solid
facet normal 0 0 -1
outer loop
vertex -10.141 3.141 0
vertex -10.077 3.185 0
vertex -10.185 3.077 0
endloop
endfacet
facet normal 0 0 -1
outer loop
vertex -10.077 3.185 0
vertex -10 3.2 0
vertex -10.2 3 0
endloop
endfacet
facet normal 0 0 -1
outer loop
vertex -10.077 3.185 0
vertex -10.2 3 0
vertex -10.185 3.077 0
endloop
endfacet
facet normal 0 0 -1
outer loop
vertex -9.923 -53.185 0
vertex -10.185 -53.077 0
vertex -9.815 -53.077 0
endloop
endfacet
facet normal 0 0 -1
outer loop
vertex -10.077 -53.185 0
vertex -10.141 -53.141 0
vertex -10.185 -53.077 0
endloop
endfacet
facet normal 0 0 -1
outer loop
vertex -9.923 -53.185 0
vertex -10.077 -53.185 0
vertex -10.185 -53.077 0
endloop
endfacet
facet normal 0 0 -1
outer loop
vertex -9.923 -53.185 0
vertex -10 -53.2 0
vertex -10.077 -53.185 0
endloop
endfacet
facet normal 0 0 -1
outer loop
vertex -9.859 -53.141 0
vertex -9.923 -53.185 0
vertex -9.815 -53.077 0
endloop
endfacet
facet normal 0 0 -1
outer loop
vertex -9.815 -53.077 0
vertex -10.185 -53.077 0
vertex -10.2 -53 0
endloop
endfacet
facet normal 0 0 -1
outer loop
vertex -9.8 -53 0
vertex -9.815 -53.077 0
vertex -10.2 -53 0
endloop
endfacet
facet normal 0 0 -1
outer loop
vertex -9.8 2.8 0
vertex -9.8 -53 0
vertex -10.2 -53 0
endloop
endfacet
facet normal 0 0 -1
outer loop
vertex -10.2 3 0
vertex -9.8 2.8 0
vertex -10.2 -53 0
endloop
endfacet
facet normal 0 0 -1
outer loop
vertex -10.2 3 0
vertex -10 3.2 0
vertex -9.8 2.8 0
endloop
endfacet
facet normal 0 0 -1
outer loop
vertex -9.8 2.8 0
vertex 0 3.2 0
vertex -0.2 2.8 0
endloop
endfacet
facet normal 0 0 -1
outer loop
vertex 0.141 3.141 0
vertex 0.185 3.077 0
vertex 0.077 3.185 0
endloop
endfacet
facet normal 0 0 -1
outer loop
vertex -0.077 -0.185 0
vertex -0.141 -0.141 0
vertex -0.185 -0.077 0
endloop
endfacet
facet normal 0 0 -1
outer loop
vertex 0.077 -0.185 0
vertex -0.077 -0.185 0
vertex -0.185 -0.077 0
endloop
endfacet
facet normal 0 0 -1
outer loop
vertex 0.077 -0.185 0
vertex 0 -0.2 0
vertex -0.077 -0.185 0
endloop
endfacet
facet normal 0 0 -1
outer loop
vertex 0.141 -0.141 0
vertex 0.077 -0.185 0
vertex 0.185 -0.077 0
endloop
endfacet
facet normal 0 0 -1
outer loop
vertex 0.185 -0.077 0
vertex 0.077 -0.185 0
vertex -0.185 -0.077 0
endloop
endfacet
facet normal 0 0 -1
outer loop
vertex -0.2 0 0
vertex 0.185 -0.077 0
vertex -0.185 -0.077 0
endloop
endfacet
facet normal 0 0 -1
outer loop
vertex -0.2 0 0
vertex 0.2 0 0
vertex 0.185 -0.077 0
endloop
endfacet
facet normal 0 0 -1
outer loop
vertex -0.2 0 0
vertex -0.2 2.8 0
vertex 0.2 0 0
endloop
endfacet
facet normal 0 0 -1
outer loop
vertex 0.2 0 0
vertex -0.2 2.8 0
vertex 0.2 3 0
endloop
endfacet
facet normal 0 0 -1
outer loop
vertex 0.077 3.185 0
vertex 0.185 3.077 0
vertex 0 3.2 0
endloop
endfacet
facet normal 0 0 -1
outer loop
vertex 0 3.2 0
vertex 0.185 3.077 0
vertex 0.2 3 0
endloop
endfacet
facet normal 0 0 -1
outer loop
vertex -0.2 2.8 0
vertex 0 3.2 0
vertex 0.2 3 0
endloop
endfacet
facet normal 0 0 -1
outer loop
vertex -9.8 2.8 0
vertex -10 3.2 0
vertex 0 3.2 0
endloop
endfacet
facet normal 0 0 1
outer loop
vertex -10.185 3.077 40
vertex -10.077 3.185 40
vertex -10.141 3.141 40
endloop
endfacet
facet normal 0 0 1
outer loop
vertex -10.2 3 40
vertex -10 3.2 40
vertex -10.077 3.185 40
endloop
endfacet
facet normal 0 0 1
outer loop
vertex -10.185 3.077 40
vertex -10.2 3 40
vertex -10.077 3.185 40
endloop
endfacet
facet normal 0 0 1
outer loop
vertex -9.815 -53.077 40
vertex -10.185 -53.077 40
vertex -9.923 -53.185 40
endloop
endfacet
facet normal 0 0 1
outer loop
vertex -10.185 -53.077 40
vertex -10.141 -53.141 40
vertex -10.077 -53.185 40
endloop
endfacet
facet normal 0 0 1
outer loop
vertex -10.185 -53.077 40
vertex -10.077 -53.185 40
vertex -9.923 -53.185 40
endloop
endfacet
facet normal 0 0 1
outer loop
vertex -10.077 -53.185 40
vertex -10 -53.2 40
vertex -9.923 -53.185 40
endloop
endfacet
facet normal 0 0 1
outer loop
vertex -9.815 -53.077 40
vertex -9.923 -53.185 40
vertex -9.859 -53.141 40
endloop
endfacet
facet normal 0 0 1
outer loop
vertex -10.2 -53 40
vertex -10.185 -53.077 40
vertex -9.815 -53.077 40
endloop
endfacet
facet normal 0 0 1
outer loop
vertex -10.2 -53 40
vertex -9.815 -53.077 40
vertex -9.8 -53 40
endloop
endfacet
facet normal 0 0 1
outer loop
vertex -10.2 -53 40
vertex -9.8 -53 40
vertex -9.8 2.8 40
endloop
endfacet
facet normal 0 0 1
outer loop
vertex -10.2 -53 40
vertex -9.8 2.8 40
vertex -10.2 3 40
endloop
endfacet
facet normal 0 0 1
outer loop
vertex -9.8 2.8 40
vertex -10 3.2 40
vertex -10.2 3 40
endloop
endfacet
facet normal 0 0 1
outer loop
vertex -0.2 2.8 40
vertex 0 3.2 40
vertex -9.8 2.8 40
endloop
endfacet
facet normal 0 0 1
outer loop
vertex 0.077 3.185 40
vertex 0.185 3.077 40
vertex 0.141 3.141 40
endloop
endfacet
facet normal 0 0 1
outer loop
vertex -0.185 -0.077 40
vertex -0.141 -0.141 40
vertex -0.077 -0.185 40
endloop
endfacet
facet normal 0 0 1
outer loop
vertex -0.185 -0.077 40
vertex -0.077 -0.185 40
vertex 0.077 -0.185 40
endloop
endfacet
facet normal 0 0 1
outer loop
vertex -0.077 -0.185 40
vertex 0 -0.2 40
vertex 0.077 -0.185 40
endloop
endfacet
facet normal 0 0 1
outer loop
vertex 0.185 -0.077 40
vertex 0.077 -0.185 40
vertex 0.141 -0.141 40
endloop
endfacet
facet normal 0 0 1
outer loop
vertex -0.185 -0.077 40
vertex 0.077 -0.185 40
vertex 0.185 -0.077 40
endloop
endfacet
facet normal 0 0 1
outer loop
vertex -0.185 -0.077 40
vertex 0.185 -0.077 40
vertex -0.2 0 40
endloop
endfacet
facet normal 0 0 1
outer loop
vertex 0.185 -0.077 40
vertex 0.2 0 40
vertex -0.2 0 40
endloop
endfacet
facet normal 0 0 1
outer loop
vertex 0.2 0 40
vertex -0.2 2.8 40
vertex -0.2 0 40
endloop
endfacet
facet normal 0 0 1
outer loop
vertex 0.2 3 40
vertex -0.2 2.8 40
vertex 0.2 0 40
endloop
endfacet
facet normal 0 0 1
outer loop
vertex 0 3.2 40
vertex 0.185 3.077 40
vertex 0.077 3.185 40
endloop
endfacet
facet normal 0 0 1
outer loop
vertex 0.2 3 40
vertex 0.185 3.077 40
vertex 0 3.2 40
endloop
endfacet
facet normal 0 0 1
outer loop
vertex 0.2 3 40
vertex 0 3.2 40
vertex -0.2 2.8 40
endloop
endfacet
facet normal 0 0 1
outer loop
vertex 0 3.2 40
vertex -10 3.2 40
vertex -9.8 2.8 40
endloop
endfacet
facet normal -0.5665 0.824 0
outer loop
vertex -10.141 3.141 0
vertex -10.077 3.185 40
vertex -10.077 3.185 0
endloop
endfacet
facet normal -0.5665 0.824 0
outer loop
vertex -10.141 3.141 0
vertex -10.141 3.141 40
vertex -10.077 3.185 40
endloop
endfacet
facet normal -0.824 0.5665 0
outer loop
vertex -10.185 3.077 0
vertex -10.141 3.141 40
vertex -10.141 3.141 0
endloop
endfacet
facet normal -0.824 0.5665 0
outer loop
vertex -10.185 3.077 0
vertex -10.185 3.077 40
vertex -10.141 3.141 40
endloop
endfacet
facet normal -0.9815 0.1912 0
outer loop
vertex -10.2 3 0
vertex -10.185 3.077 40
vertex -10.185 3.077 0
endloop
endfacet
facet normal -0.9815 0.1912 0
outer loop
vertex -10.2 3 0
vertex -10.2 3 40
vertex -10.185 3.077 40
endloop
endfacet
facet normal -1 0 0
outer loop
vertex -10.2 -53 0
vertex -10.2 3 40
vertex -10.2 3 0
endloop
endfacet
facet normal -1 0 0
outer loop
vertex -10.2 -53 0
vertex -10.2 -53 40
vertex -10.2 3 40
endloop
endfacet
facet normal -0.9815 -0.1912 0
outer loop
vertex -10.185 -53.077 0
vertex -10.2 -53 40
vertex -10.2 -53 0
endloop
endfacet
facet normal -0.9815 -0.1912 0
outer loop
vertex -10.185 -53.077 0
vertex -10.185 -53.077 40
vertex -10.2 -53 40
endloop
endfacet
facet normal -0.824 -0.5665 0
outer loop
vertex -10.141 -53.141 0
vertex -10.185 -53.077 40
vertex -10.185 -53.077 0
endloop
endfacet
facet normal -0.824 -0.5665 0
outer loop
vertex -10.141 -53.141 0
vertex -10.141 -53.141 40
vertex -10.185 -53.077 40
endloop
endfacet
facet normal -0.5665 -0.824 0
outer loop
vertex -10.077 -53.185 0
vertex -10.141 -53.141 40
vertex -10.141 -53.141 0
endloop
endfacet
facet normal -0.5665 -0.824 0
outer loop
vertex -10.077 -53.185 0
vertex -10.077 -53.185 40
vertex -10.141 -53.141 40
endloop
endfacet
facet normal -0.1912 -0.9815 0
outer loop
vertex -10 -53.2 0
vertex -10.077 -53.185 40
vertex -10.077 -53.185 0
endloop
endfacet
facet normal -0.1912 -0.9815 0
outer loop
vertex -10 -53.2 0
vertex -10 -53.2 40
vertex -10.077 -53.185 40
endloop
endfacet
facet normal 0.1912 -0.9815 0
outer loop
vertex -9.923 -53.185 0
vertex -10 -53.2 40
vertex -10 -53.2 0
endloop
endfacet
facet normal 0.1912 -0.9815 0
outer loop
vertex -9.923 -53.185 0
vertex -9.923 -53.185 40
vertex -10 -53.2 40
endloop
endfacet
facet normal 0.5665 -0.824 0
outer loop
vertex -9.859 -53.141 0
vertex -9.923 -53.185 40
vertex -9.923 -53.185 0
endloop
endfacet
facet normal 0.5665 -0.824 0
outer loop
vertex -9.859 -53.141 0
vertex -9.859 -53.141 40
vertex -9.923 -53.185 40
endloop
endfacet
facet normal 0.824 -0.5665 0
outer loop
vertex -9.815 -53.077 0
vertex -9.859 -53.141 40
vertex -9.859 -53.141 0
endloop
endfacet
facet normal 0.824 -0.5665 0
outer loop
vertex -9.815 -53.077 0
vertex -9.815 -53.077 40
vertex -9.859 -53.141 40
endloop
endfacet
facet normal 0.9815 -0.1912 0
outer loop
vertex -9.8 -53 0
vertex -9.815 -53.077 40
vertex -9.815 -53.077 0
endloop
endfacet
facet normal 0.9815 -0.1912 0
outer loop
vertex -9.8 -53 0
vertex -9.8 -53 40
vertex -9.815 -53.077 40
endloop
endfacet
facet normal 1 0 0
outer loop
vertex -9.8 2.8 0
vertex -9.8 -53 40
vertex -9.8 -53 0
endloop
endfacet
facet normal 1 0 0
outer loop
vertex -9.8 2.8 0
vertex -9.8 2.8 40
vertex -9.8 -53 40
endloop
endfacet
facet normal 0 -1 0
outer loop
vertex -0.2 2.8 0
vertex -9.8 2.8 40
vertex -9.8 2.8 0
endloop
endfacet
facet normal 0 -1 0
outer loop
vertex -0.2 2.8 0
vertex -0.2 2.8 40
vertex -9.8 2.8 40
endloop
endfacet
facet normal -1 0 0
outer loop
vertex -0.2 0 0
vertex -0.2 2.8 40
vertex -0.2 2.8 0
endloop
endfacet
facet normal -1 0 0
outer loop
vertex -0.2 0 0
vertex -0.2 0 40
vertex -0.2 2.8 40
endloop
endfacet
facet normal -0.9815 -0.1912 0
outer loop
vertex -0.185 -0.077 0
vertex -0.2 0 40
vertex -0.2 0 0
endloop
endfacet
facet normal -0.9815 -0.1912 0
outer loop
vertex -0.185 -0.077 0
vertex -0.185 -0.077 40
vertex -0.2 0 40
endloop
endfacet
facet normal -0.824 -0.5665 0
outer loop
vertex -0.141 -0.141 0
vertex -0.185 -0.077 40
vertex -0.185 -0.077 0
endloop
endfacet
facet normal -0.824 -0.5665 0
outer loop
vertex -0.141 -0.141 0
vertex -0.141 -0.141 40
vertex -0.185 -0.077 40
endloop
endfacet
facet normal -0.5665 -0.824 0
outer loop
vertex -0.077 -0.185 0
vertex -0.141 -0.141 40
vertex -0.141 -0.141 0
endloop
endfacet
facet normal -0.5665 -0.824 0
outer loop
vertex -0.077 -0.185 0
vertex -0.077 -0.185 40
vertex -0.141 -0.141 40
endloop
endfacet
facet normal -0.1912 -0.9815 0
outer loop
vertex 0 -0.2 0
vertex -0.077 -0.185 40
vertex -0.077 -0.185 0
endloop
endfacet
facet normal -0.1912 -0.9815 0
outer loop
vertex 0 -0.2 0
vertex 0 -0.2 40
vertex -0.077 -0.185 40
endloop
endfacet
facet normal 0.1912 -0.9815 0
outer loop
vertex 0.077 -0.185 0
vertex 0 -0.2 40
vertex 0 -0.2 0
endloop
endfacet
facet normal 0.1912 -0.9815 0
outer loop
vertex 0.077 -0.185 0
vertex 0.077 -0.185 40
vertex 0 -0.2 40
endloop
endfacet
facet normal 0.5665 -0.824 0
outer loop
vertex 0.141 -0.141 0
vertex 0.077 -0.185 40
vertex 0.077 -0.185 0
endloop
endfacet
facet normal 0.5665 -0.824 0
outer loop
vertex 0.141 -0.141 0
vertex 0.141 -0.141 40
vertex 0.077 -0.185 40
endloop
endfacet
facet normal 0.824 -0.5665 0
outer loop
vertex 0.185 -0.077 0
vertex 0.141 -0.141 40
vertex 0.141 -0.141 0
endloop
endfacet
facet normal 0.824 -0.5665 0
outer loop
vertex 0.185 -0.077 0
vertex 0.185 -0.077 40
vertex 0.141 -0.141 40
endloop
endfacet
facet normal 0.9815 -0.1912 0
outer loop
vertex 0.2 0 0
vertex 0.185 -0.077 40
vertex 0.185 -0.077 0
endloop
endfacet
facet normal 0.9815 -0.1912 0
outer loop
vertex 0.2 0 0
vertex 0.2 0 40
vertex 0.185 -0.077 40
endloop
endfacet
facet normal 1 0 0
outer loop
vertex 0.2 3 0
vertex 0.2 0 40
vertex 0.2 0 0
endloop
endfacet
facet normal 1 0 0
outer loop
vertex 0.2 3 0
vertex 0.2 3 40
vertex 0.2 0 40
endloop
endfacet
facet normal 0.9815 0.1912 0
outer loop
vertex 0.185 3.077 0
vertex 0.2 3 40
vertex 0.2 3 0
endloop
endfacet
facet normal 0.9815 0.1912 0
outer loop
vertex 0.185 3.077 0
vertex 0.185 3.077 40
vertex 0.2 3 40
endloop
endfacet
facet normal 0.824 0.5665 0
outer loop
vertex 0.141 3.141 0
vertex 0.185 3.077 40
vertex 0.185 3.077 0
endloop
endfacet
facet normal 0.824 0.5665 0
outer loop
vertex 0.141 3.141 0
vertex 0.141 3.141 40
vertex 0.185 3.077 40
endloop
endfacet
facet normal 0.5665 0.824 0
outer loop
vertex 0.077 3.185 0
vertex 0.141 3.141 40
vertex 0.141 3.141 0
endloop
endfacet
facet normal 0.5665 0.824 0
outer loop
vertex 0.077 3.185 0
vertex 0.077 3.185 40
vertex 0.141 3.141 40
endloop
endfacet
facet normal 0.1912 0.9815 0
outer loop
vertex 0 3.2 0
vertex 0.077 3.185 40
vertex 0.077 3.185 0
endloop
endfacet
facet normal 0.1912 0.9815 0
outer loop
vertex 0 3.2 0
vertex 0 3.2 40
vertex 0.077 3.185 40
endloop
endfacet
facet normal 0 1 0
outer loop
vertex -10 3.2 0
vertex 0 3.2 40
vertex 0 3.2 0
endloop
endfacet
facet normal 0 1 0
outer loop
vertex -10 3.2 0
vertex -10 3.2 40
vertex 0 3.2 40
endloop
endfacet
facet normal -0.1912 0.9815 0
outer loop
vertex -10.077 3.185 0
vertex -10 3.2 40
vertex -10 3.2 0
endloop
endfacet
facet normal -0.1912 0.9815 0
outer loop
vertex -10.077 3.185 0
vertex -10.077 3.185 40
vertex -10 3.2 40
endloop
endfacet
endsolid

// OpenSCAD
points = [
    [   0,   0],
    [   0,  3],
    [ -10,  3],
    [ -10, -53]
];


wall_thickness = 0.4;
wall_height    = 40;

// Extrude the created wall path
linear_extrude(height = wall_height) {
    poly_line(points, wall_thickness);
}

// Module to create a thick line from open points
module poly_line(pts, thickness) {
    for (i = [0 : len(pts) - 2]) {
        hull() {
            translate(pts[i]) circle(d = thickness, $fn = 16);
            translate(pts[i+1]) circle(d = thickness, $fn = 16);
        }
    }
}
